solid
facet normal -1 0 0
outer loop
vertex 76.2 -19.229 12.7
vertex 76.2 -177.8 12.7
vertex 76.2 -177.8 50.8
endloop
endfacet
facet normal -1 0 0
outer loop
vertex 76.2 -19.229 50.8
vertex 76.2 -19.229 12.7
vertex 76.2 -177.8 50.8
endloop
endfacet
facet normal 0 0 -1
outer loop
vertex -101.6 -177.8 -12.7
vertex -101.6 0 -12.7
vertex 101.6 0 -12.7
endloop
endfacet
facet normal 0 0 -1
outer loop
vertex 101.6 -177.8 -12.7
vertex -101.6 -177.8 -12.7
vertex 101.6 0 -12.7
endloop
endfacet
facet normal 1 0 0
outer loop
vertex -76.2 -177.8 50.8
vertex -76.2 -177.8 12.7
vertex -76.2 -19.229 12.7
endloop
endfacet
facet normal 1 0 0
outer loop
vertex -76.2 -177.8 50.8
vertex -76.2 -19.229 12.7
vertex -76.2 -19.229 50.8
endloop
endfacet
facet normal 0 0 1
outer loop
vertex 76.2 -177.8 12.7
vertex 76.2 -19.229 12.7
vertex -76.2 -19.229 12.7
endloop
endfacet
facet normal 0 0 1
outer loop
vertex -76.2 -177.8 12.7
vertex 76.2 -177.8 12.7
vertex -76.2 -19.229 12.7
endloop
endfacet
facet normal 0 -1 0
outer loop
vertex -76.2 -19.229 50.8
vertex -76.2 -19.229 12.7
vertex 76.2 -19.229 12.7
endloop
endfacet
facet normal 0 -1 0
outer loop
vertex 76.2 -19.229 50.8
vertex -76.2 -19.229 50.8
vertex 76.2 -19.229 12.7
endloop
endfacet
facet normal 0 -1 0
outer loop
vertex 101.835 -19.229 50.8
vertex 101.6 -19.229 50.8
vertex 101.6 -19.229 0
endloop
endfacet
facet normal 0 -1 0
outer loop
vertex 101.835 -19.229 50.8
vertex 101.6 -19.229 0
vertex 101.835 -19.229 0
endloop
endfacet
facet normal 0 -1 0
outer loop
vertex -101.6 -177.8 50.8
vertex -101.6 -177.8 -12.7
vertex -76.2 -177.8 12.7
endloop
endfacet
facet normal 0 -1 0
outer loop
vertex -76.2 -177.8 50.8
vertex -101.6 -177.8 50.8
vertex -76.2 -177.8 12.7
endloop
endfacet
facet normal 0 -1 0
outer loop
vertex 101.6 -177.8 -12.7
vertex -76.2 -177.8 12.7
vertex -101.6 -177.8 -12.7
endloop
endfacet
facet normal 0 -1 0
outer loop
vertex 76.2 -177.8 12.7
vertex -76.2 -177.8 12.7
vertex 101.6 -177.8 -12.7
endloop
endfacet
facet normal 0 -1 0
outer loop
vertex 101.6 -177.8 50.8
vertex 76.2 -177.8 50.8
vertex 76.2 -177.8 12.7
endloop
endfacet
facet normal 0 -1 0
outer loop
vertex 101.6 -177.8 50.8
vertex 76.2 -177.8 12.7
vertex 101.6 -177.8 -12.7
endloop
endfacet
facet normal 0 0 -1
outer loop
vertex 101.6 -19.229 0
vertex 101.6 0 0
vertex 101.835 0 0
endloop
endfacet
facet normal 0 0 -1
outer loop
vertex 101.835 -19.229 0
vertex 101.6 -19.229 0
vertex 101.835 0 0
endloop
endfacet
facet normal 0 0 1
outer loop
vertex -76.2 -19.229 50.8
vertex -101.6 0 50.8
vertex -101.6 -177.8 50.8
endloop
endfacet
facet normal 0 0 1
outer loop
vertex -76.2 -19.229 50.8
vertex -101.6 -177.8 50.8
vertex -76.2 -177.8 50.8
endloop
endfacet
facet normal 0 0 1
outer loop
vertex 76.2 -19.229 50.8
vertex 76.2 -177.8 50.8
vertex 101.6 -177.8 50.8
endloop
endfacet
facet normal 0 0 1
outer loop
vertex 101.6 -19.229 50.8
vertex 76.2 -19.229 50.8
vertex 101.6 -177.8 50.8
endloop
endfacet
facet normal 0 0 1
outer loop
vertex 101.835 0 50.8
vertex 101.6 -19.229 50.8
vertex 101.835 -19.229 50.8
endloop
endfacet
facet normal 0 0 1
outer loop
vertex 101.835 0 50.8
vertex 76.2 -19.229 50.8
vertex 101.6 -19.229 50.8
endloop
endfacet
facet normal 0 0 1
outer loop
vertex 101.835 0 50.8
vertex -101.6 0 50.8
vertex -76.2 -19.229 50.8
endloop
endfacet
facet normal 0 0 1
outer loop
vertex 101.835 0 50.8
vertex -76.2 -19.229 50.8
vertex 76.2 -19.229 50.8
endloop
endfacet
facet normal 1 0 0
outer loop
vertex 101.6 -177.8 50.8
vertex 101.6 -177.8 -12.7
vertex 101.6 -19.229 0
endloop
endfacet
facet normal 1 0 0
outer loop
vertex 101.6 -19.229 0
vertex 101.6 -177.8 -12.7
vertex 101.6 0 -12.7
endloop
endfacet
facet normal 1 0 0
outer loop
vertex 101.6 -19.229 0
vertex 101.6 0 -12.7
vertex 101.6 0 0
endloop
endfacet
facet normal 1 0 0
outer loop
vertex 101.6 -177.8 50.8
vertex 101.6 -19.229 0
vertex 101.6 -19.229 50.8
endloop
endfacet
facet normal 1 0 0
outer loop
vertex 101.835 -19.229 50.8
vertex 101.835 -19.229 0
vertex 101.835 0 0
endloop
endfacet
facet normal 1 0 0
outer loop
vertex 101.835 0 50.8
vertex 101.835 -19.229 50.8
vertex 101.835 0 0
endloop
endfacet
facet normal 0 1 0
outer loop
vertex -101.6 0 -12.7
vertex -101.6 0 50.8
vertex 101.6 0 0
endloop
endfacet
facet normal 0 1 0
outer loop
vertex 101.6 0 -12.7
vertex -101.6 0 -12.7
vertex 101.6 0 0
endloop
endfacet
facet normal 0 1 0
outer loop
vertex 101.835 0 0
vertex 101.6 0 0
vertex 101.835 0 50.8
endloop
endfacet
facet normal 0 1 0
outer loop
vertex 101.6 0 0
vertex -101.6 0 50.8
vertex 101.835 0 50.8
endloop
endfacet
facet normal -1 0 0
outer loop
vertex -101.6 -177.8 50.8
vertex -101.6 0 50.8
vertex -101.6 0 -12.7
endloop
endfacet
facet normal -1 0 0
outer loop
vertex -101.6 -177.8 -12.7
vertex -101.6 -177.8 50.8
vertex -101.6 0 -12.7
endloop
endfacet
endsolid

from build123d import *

# Parameters (mm, degrees)
F0_W     = 25.4
F0_H     = 25.4
F0_W_2   = 152.4
F0_H_2   = 38.1
F1_DEPTH = 177.8
F2_W     = 203.2
F2_H     = 19.2293866986
F3_DEPTH = 50.8


# Not quite as in the source:
# - a feature names something its author has since deleted; it is built from what else it names


with BuildPart() as f1:
    # F0 (on Front) → F1 (new body)
    with BuildSketch(Plane.XZ):
        with Locations((-88.9, 0)):
            Rectangle(F0_W, F0_H)
        Rectangle(F0_W_2, F0_H)
        with Locations((88.9, 0)):
            Rectangle(F0_W, F0_H)
        with Locations((88.9, 31.75)):
            Rectangle(F0_W, F0_H_2)
        with Locations((-88.9, 31.75)):
            Rectangle(F0_W, F0_H_2)
    extrude(amount=F1_DEPTH)

    # F2 (on Top) → F3 (join)
    with BuildSketch(Plane.XY):
        with Locations((0.2353874207, -9.6146933493)):
            Rectangle(F2_W, F2_H)
    extrude(amount=F3_DEPTH)


solid = f1.part
